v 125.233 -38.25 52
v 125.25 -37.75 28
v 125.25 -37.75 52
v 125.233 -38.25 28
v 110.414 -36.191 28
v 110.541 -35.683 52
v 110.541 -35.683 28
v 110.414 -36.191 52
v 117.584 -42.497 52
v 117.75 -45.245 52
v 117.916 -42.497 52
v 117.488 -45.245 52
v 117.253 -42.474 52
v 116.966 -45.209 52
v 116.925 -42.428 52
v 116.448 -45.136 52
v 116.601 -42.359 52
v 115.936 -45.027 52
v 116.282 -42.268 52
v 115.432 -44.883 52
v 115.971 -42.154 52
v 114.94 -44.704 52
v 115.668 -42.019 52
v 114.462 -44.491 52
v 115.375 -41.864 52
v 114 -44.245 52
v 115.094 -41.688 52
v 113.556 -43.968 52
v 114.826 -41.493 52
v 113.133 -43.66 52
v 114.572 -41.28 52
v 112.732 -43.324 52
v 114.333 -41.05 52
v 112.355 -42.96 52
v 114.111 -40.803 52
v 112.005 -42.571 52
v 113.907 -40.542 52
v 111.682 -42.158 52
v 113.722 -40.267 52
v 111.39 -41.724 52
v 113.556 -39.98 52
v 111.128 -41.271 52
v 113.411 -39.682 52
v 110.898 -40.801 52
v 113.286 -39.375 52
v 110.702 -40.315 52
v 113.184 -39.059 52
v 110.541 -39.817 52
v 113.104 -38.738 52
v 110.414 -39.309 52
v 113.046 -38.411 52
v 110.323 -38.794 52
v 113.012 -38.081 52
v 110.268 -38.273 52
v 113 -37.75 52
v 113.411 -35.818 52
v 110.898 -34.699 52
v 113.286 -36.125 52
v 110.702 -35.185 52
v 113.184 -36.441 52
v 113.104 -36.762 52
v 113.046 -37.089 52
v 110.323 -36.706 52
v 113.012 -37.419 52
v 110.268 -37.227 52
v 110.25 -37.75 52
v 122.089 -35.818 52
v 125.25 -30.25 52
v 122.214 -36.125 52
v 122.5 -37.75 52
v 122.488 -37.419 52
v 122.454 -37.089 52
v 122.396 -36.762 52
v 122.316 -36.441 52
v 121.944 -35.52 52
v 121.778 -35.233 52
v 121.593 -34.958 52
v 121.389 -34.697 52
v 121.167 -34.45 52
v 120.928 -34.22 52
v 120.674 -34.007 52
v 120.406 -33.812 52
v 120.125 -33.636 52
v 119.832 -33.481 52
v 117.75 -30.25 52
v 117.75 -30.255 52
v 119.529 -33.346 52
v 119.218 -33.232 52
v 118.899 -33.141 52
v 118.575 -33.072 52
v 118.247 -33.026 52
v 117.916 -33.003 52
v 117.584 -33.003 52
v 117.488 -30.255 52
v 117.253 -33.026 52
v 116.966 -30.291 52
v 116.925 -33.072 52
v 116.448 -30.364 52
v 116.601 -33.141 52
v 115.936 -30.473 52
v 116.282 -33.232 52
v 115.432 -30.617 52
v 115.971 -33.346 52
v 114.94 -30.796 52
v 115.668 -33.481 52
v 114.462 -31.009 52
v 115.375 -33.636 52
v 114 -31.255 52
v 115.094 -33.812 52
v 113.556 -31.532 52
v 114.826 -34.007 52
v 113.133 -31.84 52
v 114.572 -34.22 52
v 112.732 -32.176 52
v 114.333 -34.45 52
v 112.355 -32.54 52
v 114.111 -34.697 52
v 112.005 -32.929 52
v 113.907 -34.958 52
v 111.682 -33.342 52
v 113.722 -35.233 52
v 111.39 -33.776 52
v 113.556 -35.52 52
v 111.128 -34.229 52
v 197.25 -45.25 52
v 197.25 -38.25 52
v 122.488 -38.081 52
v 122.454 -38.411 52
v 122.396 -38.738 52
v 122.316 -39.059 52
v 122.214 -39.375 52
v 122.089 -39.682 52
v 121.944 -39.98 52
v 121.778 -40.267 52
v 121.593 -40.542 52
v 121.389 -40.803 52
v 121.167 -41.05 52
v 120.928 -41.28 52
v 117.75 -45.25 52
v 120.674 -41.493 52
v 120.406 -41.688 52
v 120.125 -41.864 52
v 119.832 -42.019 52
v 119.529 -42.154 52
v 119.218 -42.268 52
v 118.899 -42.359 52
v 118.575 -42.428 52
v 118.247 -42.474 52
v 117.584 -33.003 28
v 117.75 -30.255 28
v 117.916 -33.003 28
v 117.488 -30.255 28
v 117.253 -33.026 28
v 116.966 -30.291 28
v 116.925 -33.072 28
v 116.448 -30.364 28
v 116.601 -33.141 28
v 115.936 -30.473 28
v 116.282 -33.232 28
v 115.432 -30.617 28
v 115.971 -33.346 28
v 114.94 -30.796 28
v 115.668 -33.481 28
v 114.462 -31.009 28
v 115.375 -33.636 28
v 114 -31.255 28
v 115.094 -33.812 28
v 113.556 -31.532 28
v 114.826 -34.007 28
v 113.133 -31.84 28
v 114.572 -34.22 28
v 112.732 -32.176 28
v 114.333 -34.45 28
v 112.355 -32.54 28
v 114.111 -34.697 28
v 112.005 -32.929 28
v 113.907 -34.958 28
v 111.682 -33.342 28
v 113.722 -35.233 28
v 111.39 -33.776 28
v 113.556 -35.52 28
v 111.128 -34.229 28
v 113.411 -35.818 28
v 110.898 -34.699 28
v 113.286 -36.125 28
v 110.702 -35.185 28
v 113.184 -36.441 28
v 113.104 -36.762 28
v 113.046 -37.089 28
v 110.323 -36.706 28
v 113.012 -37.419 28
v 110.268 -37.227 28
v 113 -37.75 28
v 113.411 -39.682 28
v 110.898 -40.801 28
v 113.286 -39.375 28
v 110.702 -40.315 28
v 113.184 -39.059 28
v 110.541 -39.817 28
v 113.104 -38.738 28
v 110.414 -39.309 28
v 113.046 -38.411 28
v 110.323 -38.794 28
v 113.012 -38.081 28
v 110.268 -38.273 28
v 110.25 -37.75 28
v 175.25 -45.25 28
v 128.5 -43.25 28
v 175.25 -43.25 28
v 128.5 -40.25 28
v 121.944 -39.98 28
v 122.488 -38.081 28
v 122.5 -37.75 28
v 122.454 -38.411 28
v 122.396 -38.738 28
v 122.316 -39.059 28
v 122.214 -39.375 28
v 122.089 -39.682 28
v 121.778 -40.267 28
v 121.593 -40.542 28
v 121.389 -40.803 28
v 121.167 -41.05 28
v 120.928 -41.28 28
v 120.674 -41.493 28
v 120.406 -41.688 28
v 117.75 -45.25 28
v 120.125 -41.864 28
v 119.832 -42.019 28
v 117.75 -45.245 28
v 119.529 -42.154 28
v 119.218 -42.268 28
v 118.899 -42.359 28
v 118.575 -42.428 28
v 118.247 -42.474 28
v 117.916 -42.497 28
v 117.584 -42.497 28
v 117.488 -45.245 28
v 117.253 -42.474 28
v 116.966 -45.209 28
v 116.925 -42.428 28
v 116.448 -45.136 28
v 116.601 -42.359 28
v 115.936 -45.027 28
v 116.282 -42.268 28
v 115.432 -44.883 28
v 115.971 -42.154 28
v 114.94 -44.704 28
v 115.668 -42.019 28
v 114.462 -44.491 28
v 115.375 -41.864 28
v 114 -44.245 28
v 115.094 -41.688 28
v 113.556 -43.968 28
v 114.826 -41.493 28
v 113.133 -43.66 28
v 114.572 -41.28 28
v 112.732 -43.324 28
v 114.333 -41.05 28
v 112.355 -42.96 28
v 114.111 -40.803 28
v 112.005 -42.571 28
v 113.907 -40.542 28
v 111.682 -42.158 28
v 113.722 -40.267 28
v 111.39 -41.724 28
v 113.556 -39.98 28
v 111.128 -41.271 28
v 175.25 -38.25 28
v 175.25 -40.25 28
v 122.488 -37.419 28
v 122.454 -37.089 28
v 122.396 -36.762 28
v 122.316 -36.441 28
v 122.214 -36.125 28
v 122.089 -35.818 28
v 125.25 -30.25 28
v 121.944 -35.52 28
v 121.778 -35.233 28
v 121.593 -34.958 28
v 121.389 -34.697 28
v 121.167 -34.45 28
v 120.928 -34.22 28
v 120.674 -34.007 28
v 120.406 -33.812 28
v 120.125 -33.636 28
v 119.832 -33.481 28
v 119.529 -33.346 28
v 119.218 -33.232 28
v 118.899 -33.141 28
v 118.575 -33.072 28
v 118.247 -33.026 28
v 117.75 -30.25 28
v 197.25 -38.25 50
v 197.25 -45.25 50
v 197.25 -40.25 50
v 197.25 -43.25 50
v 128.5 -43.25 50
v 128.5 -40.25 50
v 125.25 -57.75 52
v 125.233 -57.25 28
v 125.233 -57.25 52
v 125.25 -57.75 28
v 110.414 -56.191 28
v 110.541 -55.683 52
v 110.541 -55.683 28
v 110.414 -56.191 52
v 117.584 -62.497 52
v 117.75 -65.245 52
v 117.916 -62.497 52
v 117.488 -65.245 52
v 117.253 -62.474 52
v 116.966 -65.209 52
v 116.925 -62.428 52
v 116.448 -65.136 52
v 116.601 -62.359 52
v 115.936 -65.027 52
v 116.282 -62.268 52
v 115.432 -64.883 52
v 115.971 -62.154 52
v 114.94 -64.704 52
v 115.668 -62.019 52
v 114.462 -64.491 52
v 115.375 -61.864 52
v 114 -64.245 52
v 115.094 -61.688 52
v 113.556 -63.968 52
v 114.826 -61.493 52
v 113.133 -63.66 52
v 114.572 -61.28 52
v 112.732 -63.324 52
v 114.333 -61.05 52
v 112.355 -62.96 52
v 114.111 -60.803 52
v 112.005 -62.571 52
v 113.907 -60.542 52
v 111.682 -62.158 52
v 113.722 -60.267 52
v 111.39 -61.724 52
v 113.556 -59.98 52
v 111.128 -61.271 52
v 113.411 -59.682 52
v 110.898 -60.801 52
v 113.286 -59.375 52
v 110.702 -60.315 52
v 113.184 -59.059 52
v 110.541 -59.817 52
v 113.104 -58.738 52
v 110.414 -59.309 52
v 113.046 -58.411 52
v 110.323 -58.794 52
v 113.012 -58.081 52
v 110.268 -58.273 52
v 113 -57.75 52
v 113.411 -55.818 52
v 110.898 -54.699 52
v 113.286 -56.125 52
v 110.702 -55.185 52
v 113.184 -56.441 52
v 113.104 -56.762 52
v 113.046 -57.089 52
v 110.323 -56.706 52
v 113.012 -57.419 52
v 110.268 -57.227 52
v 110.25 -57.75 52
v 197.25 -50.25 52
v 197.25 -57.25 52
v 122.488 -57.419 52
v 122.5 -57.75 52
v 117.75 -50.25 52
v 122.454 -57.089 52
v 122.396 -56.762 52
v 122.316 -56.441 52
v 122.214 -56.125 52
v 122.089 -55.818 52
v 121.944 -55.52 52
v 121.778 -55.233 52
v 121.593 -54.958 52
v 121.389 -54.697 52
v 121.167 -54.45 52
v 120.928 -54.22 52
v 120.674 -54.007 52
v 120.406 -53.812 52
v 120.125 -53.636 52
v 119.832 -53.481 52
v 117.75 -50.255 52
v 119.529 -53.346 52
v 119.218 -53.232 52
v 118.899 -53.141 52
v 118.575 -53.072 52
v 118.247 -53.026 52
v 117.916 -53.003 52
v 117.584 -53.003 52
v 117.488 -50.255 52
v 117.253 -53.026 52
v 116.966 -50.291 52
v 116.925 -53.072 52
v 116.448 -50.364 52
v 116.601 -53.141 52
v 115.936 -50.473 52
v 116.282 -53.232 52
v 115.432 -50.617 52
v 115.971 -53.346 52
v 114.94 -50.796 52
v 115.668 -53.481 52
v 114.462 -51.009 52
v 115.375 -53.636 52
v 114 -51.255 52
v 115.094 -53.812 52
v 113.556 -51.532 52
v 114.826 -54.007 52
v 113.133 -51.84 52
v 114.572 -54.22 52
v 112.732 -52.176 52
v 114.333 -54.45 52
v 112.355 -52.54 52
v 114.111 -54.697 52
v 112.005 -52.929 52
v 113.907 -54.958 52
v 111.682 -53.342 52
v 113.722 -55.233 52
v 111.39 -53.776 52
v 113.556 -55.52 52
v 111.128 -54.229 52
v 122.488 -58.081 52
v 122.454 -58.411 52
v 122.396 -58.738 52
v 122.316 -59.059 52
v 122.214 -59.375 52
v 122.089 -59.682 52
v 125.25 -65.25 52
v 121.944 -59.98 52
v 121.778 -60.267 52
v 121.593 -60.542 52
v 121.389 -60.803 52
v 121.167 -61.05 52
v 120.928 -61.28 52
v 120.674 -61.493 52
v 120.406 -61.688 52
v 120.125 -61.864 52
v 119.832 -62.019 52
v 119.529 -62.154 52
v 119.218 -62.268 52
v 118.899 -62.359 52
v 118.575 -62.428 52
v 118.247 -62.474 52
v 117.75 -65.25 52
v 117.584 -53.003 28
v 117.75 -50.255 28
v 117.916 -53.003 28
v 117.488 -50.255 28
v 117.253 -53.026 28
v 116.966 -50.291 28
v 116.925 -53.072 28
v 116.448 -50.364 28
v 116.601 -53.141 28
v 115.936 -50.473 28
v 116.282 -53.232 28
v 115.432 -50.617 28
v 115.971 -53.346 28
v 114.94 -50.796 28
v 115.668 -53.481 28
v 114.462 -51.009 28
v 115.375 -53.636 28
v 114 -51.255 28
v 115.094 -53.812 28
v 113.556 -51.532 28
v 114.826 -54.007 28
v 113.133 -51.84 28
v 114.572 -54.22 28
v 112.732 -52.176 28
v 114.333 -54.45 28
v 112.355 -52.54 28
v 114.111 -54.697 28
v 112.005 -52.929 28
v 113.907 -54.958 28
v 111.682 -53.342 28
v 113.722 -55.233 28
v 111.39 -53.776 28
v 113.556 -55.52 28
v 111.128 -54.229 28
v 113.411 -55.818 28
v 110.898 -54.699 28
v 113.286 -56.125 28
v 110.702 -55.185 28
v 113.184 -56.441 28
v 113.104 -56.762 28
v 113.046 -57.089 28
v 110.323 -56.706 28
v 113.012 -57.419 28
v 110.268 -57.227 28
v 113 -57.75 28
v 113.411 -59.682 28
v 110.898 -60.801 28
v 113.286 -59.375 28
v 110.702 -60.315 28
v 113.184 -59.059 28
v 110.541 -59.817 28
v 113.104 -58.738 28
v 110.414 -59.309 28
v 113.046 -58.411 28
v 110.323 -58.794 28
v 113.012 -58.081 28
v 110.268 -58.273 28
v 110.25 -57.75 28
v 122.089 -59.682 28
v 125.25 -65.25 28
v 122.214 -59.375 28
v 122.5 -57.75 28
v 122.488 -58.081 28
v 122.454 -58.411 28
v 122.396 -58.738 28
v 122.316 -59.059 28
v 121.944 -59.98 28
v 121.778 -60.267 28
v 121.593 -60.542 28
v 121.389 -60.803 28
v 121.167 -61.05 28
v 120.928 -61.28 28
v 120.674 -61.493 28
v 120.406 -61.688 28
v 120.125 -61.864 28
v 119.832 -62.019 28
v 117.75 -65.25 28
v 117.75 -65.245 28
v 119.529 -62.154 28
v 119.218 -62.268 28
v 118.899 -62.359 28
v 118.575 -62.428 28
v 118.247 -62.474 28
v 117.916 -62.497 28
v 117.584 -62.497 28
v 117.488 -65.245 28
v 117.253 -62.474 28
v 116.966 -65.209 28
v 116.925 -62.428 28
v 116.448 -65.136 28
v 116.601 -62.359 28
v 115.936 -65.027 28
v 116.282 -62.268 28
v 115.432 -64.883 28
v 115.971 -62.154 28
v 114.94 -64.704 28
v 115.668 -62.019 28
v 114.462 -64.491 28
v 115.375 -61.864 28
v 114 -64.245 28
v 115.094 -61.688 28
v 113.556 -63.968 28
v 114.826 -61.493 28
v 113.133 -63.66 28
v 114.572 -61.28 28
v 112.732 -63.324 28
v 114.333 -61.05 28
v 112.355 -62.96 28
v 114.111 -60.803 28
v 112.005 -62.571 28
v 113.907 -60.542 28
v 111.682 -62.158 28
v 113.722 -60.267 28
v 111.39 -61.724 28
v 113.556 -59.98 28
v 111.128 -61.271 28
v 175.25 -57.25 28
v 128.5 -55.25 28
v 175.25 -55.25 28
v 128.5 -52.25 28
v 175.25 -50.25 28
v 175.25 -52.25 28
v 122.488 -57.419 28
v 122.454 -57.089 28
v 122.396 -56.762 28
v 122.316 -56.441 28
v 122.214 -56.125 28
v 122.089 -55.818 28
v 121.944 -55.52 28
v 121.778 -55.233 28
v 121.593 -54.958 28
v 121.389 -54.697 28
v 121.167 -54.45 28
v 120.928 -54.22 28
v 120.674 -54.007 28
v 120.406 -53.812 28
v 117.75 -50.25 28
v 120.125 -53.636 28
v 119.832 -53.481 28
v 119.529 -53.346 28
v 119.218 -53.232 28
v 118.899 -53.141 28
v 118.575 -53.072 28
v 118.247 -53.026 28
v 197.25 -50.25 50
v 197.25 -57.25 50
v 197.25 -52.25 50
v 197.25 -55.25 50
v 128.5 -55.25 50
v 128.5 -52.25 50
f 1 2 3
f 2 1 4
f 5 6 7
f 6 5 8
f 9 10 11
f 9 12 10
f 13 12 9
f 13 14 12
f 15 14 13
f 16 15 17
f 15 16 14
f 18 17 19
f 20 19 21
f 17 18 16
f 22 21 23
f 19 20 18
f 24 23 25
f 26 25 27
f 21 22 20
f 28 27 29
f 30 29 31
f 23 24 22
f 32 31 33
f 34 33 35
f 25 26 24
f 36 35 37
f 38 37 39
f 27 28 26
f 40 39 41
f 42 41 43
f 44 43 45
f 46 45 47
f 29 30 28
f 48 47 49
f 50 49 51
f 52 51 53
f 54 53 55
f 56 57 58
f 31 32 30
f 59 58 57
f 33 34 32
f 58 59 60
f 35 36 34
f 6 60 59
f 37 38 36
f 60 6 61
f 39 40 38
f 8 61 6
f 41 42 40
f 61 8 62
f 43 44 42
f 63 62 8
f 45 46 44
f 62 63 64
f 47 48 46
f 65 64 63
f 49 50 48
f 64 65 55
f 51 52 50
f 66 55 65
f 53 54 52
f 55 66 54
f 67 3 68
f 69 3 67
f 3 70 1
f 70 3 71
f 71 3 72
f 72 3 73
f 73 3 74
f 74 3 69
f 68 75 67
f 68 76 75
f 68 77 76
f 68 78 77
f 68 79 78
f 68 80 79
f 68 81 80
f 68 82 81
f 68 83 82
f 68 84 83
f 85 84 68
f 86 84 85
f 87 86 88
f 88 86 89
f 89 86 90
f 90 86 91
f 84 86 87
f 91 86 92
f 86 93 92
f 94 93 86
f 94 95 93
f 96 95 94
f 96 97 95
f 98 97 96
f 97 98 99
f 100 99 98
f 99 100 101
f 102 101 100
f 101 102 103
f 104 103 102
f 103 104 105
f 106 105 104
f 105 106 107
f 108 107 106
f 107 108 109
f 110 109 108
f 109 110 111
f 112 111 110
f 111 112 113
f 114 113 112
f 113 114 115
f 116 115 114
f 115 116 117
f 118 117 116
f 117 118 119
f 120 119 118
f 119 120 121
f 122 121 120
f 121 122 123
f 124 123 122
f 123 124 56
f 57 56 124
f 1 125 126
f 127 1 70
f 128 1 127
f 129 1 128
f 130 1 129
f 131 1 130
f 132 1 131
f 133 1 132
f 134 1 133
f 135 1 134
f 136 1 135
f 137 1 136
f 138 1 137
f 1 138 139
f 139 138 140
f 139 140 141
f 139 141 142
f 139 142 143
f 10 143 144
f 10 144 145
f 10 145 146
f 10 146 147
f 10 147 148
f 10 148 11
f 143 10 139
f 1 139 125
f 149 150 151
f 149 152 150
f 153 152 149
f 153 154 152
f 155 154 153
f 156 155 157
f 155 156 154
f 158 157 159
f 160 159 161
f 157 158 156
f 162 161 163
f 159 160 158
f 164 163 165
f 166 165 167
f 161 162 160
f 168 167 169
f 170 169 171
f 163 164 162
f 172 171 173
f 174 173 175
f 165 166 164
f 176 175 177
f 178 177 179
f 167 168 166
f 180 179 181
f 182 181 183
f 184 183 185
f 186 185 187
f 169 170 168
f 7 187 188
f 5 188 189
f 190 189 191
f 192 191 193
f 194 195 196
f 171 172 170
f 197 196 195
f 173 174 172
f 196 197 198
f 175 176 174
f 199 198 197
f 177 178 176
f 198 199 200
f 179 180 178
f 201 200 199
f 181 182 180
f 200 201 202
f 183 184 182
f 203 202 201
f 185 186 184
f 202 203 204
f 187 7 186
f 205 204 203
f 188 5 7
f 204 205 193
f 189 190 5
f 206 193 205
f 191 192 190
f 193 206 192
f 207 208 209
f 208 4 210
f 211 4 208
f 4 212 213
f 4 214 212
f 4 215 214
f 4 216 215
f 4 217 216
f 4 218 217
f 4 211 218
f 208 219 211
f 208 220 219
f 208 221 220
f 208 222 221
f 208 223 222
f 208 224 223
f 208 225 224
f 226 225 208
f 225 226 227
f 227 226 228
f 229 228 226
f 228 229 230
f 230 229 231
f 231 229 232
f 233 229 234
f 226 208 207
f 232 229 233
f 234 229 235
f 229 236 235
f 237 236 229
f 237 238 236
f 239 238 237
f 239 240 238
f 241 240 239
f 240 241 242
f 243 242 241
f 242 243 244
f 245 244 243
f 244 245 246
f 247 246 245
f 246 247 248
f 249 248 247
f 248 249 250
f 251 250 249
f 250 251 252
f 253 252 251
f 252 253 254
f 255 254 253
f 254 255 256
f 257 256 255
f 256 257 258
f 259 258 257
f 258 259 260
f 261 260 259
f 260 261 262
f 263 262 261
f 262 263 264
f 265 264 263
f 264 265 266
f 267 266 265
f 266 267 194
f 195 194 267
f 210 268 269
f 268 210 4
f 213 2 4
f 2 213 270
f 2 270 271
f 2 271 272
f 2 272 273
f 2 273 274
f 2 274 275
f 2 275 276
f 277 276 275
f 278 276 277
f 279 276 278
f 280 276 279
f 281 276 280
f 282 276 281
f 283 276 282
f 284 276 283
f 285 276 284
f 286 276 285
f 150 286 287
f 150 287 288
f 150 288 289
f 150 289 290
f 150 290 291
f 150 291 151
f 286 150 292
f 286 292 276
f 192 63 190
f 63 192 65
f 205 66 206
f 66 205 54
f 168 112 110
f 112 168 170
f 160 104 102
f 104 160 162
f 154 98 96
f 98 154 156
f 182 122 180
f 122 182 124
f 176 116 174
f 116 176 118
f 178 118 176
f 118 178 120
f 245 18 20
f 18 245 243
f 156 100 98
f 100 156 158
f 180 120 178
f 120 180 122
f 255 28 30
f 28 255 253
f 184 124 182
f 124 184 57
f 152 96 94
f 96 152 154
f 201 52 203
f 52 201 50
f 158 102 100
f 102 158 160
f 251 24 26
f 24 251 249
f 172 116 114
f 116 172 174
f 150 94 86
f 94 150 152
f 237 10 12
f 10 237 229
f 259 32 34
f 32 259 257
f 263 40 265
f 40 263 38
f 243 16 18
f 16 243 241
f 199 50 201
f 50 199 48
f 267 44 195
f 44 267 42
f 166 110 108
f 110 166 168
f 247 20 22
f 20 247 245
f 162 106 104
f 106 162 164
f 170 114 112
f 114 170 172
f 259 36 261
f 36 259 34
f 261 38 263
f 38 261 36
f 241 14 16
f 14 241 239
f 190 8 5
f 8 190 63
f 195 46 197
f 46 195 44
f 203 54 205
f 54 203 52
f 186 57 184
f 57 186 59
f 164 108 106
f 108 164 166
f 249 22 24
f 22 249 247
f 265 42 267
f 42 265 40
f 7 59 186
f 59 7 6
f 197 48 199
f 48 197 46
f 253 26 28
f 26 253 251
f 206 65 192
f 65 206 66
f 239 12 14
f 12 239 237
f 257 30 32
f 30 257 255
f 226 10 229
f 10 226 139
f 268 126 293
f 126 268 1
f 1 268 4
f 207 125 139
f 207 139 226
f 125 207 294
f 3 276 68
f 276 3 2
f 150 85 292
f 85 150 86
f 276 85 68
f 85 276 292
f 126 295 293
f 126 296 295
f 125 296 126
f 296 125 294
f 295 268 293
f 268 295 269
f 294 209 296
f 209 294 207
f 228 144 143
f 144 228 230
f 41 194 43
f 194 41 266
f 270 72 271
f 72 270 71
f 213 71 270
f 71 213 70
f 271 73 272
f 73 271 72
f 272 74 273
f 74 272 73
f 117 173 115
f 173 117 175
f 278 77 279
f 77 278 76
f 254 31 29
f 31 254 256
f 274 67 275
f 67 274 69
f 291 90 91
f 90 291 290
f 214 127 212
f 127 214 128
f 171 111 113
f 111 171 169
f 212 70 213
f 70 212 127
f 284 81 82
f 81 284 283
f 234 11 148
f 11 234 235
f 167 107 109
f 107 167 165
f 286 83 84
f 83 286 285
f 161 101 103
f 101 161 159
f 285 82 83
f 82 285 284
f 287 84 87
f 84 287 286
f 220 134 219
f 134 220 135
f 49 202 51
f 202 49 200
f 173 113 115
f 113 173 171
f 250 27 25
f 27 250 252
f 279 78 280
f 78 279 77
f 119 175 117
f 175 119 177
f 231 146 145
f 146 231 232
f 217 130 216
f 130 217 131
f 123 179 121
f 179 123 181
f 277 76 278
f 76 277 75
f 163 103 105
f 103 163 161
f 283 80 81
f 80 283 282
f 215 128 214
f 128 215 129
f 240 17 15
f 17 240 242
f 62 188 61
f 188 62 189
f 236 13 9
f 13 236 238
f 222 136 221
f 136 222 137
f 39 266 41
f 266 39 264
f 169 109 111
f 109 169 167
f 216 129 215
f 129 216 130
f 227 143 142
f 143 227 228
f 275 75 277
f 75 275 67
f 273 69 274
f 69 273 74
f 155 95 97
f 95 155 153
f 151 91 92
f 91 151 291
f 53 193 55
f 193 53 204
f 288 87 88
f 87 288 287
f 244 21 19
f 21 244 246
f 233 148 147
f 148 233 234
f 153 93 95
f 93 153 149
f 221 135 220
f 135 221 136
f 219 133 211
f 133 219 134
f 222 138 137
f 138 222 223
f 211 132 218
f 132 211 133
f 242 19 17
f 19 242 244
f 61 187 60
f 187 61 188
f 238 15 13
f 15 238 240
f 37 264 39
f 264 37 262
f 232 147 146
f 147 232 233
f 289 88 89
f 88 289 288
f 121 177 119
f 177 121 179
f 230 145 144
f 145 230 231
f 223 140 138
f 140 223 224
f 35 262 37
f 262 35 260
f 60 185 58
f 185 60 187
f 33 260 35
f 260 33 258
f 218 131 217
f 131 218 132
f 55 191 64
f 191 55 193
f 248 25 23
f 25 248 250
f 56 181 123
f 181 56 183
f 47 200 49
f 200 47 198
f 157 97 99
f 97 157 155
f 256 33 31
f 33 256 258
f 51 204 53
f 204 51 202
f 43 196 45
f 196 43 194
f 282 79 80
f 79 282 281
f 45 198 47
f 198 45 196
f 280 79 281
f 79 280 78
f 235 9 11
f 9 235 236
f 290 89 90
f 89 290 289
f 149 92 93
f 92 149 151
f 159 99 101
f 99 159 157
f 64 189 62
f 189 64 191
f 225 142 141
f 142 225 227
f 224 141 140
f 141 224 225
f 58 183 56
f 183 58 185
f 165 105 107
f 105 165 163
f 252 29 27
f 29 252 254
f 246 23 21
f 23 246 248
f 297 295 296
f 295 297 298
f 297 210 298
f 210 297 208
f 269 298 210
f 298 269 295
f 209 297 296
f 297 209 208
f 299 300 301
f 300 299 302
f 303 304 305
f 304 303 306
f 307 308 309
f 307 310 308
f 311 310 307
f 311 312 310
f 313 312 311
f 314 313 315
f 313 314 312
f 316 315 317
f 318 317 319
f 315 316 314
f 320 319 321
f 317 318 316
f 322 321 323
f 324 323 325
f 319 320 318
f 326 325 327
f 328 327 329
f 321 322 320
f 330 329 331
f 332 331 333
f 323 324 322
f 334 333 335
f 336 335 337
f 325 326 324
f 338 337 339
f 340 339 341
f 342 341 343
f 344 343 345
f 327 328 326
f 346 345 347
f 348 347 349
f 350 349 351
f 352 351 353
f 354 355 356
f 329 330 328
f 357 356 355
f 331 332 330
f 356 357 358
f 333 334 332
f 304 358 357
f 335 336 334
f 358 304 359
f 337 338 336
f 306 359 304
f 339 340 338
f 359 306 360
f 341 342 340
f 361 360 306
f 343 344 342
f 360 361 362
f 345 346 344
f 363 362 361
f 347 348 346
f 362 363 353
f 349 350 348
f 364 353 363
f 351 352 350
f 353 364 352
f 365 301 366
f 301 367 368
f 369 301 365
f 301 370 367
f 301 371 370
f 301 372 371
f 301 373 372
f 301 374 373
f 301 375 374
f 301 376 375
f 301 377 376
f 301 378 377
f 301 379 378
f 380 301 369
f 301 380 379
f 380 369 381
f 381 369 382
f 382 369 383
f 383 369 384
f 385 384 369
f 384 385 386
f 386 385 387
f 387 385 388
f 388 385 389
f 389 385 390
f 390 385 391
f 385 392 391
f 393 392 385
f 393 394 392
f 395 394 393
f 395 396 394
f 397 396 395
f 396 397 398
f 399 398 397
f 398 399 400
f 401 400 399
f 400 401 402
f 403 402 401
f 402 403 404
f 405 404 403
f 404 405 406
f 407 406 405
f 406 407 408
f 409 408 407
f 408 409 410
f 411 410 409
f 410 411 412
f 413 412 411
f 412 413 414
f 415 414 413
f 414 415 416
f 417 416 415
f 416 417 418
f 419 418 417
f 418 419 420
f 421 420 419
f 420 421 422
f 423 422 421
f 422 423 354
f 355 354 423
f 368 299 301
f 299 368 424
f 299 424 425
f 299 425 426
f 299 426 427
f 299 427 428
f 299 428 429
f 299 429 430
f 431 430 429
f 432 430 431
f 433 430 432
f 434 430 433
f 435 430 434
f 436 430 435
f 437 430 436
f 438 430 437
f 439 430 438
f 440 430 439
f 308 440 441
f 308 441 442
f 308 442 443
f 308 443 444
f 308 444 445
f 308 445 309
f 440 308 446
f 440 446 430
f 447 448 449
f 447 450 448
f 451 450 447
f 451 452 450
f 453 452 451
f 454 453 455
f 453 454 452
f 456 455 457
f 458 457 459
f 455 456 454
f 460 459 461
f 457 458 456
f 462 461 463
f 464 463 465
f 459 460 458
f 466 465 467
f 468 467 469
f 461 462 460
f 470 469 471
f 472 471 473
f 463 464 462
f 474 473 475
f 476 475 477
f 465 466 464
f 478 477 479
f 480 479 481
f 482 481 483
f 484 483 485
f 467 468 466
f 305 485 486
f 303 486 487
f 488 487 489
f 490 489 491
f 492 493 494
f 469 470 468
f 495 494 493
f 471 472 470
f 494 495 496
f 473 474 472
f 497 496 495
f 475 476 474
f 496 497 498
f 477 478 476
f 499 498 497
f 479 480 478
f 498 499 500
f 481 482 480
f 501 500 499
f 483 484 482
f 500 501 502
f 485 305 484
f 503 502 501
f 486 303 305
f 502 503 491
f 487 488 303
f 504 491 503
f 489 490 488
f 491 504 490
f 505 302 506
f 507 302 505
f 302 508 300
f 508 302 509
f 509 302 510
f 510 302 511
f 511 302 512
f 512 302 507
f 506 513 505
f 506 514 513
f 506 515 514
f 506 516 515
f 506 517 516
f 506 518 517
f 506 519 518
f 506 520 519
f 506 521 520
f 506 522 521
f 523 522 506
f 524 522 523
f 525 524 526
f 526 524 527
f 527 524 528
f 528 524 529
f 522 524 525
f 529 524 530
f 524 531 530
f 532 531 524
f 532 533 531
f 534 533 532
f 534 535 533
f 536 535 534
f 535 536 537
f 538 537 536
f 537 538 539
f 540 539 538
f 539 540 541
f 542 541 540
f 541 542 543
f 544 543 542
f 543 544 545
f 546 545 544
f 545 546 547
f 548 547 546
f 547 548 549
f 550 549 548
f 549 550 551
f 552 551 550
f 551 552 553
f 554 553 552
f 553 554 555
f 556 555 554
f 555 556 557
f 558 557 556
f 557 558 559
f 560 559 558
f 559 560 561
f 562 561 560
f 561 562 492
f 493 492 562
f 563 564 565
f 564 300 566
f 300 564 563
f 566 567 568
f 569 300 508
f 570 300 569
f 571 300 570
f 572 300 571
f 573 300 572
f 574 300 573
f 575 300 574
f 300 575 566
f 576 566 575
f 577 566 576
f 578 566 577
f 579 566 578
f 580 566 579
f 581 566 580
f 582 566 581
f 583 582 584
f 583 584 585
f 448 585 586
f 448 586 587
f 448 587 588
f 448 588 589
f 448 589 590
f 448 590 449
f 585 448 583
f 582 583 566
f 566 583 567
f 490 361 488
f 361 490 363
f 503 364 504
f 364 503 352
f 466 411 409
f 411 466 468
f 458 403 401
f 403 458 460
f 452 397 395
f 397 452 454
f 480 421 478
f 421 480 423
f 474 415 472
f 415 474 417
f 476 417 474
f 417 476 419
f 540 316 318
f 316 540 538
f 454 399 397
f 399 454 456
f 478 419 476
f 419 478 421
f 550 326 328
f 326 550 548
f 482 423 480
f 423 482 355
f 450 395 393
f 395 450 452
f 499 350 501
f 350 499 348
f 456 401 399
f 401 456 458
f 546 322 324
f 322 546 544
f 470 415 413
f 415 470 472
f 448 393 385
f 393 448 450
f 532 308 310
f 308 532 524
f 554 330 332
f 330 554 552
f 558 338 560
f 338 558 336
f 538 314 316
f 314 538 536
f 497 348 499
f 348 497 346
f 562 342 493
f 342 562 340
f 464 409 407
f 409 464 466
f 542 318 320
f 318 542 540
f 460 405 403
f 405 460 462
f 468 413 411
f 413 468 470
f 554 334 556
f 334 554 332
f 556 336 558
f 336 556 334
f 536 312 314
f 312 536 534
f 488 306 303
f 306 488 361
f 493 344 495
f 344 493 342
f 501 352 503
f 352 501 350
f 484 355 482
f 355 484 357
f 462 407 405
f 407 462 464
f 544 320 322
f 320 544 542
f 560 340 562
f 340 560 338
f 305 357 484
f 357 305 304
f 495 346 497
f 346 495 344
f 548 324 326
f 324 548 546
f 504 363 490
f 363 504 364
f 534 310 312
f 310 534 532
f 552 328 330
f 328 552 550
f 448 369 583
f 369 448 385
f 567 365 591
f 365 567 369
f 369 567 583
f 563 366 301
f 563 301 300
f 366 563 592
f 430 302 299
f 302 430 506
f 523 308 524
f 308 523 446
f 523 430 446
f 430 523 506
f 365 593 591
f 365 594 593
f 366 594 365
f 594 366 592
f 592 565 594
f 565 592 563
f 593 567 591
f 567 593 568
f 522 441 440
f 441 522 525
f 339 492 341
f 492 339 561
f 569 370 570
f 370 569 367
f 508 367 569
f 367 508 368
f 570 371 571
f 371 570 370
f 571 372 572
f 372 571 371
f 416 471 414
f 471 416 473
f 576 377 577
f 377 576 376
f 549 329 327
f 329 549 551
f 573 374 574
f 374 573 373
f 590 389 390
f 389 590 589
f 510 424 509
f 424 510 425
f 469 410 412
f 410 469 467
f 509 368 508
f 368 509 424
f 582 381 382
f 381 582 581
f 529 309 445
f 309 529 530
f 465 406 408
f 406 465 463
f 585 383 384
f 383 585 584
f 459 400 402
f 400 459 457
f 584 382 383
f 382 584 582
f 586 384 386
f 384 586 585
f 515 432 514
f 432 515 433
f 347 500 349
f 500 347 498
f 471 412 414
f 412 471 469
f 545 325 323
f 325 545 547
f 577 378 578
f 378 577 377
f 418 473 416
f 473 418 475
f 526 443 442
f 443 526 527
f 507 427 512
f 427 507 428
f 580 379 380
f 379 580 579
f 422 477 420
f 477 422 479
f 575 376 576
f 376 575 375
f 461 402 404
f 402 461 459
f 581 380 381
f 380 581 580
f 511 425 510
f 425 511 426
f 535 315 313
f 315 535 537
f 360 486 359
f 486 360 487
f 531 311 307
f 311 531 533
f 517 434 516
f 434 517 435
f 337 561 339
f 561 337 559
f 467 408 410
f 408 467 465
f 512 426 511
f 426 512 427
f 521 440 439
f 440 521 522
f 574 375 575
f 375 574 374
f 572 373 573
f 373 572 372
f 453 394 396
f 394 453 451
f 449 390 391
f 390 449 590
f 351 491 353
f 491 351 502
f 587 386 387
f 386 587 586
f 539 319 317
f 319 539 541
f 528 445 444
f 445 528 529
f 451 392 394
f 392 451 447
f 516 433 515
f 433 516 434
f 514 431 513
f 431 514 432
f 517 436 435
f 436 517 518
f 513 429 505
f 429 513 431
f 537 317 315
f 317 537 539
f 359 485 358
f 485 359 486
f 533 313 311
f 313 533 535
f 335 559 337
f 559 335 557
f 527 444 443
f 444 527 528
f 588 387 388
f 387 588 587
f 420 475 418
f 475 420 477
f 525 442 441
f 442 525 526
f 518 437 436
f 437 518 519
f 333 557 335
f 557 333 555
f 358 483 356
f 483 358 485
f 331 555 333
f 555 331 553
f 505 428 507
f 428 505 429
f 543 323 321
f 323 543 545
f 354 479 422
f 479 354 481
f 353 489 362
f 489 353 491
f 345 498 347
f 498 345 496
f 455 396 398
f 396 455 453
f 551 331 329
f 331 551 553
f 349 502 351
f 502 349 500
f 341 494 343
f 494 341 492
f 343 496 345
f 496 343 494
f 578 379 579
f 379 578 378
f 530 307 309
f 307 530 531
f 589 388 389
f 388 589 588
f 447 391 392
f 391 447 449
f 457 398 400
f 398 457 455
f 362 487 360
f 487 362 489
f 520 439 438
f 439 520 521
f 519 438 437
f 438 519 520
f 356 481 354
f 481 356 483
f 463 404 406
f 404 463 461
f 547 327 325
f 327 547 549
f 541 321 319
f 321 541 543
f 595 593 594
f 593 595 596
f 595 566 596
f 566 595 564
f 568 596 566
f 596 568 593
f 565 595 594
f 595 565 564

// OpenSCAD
$fn = 90;
tol = 0.2;
z_tol = 0.5;
eps = 0.01;

// connector properties
c_a = 51;
c_wt = 5;
c_wh = 25;
c_h = 22;

// M3
// bolt and nuts parameters
m3_l=13;
m3_d=3;
m3_nd=6.25+tol;
m3_nh=2.3;
m3_hd=5.5+tol;
m3_hh=2;

// screw
m3_shd = 7.0+tol;
m3_sd = 3.5;
m3_sl = 20;

m3_off = 5;

// plexiglass holder parameters
pg_t = 3;
pg_wt = 2;

// foot interface parameters
// height of the foot interface part
ft_h = 22;
// additional foot height for the insulation and cable management
ft_ho = 6;
// thickness of the part screwed to the lower table
ft_t = 2;
// diameter of the inner cone base
ft_Di = 35;
// diameter of the outer cone base
ft_Do = ft_Di + 1;
// diameter of the top inner cone area
ft_di = 20;
// diameter of the top outer cone area
ft_do = ft_di + 1;
// height of the inner cone
ft_chi = 14.5;
// height of the outer cone
ft_cho = ft_chi + 0.5;

// huge hole depths
// absolute base, e.g. piece screwed to the table dest bellow
hhd_b = 5;
// middle piece on the foot of the table leg
hhd_m = 4;
// top part connected to the top desk
hhd_t = 3;

// hinge parameters
// bottom hinge inner height
hh_ib = 16+8;
// bottom hinge outer height
hh_ob = hh_ib + z_tol;
// top hinge inner height
hh_it = 16;
// top hinge outer height
hh_ot = hh_it + z_tol;

// hinge diameters
h_id = 9;
h_od = h_id + 0.5;
h_iD = h_id + 6;
h_oD = h_od + 6;

// hinge frames lenght
hf_lu = 50;

// hole for the m3 nuts and bolt
module bn_hole()
{
    // nuts
    translate([0,0,-1.5*m3_l+eps])
        cylinder(d=m3_nd, h=m3_l, $fn=6);
    // bolt body
    translate([0,0,-0.5*m3_l])
        cylinder(d=m3_d, h=m3_l);
    // bolt head
    translate([0,0,0.5*m3_l-eps])
        cylinder(d=m3_hd, h=m3_l);
}


// hole for the 3mm screws
module s_hole()
{
    // head
    _h = m3_shd-m3_d;
    cylinder(d1=m3_shd,d2=m3_sd,h=_h/2);
    // body
    cylinder(d=m3_sd,h=m3_sl);
}


// hole for the huge screw
module huge_screw_hole(hh)
{
    // body
    cylinder(d=7, h=c_h);
    // head
    cylinder(d=14,h=hh);
}


// round corner cube module
module rc_cube(size,r)
{
    a = size.x;
    b = size.y;
    c = size.z;
    
    pos = [ [r,r,0],
            [r,b-r,0],
            [a-r,b-r,0],
            [a-r,r,0]];
    
    // corners
    for(p=pos)
    {
        translate(p)
            cylinder(r=r,h=c);
    }
    
    // inner fill
    translate([r,0,0])
        cube([a-2*r,b,c]);
    translate([0,r,0])
        cube([a,b-2*r,c]);
}



// module creating cube with top/buttom sloped side
module ss_cube(size,sh)
{
    // main cube parameters
    A = size.x;
    B = size.y;
    C = size.z;
    
    // small cube creating slope parameter
    a = A - 2*abs(sh);
    b = B - 2*abs(sh);
    c = abs(sh);
    t = sh > 0 ? [sh,sh,C] : [-sh,-sh,sh];
    
    render(1)
    hull()
    {
        cube([A,B,C]);
        translate(t)
            cube([a,b,c]);
    }    
}


module ses_cube(size,sh)
{
    render(3)
    difference()
    {
        ss_cube(size, sh);
        a = size.x - 2*abs(sh);
        b = size.y - 2*abs(sh);

        c = abs(sh);
        t = sh > 0 ? [sh,sh,size.z+sh] : [-sh,-sh,2*sh];
        translate(t)
            ss_cube([a,b,c],-sh);
    }
    
}


// plexiglass holder
module pg_holder(bt=pg_wt)
{
    difference()
    {
        render(1)
        hull()
        {
            // horizontal part
            translate([0,0,pg_wt-bt])
                cube([c_h,pg_t+2*pg_wt,bt]);
            // vertical part
            translate([-(bt)+pg_wt,0,-bt+pg_wt])
                cube([bt,pg_t+2*pg_wt,c_h+bt-pg_wt]);
        }
        translate([pg_wt,pg_wt,pg_wt])
            cube([c_h,pg_t,c_h]);
    }
    
}


// basic shape of the connector
module connector_base(off=0,cut=0)
{
    // base part
    translate([-c_a/2-c_wt,-c_a/2-c_wt,(off==-1 ? -off : 0 )*c_wh])
        rc_cube([c_a+c_wt,c_a+c_wt,c_h/2],5);
    // main geometry
    render(1)
    hull()
    {
        _xo = (cut==-1 ? (cut)*h_oD : 0);
        _yo = -(cut==+1 ? (cut)*h_oD : 0);
        translate([-c_a/2-c_wt,-c_a/2-c_wt,0])
            rc_cube([c_a+c_wt+_xo,c_a+c_wt+_yo,c_h/2+c_wh],5);
        translate([-c_a/2,-c_a/2,off*5])
            cube([c_a-5+_xo,c_a-5+_yo,c_h/2+c_wh]);
    }
}


module bolt_holes(generate=[1,1,1,1])
{
    pos = [ [-c_a/2+m3_off,-c_a/2+m3_off,0],
            [-c_a/2+m3_off,+c_a/2-m3_off,0],
            [+c_a/2-m3_off,+c_a/2-m3_off],
            [+c_a/2-m3_off,-c_a/2+m3_off]];
    
    for(i=[0:3])
    {
        p=pos[i];
        if(generate[i]==1)
        {
            translate(p)
                bn_hole();
        }
    }
}

module screw_holes(off=0)
{
    // '-> positions
    s_pos = [   [+c_a/2-c_wt-m3_shd,-c_a/2-c_wt-eps,off+m3_shd],
                [-c_a/2+m3_shd,-c_a/2-c_wt-eps,off-m3_shd+c_wh],
                [-c_a/2-c_wt-eps,-c_a/2+m3_shd,off+m3_shd],
                [-c_a/2-c_wt-eps,+c_a/2-c_wt-m3_shd,off-m3_shd+c_wh],
                [c_a/2+c_wt+eps,+c_a/2-c_wt-m3_shd,off+m3_shd],
                [c_a/2-c_wt-m3_shd,+c_a/2+c_wt+eps,off-m3_shd+c_wh]];
    
    // '-> rotations
    s_rot = [   [-90,0,0],
                [-90,0,0],
                [0,90,0],
                [0,90,0],
                [0,-90,0],
                [90,0,0]];
    
    for(i=[0:5])
    {
        cp = s_pos[i];
        cr = s_rot[i];
        translate(cp)
            rotate(cr)
                s_hole();
    }  
    
}


// main hinge 
module outer_hinge(h,right=0,bolt_offset=0)
{
    // main hinge axle
    difference()
    {
        
        union()
        {
            rotate([0,0,0*90])
            {
                cylinder(d=h_oD,h=h);
                    
                cube([h_oD/2,h_oD/2,h]);
                translate([-h_oD/2,-h_oD/2,0])
                    cube([h_oD/2,h_oD/2,h]);
            }
            
            // cutting off the outer support wall
            rotate([0,0,(-right)*90])
            {
                translate([-h_oD/2,-h_oD/2-c_wt,0])
                    cube([h_oD+eps,c_wt+h_oD/2,h]);
                translate([-h_oD/2,-h_oD/2-c_wt-eps,0-(c_h-h)/2-eps])
                    cube([h_oD,c_wt+eps,c_h+2*eps]);
            }
        }
        translate([0,0,-eps])
            cylinder(d=h_id,h=h+2*eps);
    }
    
    // bolt reinforcement
    translate([0,0,h-ft_h+m3_l/2+z_tol+m3_nh+bolt_offset])
        rotate([180,0,0])
            bn_hole();
}


module outer_hinge_simple(h,right=0)
{
    // main hinge axle
    difference()
    {
        
        union()
        {
            // I am sorry, but this make not much sense
            rotate([0,0,180-right*90])
            {
                cylinder(d=h_oD,h=h);
                
                cube([h_oD/2,h_oD/2,h]);
                translate([-h_oD/2,-h_oD/2,0])
                    cube([h_oD/2,h_oD/2,h]);
                translate([-h_oD/2,-h_oD/4,0])
                cube([3*h_oD/4,3*h_oD/4,h]);
            }
        }
        translate([0,0,-eps])
            cylinder(d=h_id,h=h+2*eps);
    }
    
    // bolt reinforcement
    translate([0,0,h-ft_h+m3_l/2+z_tol+m3_nh])
        rotate([180,0,0])
            bn_hole();
}

/********************
* UPPER CONNECTOTRS *
********************/
// REGULAR UPPER CONNECTORS (BACK)
module upper_upper_connector()
{
    difference()
    {
        // basic shape and the plexiglass hooks
        union()
        {
            // connector base
            connector_base(1);
            
            // additional support
            leg_inner_support(upper=1);
            
            // plexiglass hooks
            translate([c_a/2-pg_wt,-c_a/2,c_h/2])
                difference()
                {
                    rotate([0,90,0])
                        pg_holder();
                    _a = c_h;
                    translate([-eps,-eps,-_a-eps])
                        cube([_a,_a,_a/2+eps]);
                }
                
            // plexiglass hooks
            translate([-c_a/2+2*pg_wt+pg_t,c_a/2-pg_wt,c_h/2])
                difference()
                {
                    rotate([0,90,90])
                        pg_holder();
                    _a = c_h;
                    translate([eps-_a,-eps,-_a-eps])
                        cube([_a,_a,_a/2+eps]);
                }
        }
        
        // cut for the table leg
        translate([-c_a/2,-c_a/2,c_h/2])
            ses_cube([c_a+eps,c_a+eps,2*c_wh+eps],-3);
        
        
        // main hole cut
        translate([0,0,-c_h/2+eps])
            huge_screw_hole(hhd_t);
        
        
        // holes for the bolts and nuts
        bolt_holes();
        
        // holes for the screws
        screw_holes(c_h/2);
    }

}

module leg_inner_support(upper=0)
{
    cut = 1;
    translate([5,5,0])
    render(1)
    hull()
    {
        _xo = h_oD;
        _yo = h_oD;
        translate([-c_wt,-c_wt,0])
            rc_cube([c_a/2+c_wt,c_a/2+c_wt,(upper == 0) ? c_h/2+c_wh : c_h/2],5);
        translate([0,0,(upper == 0) ? -5 : 0])
            cube([c_a/2-5,c_a/2-5,(upper == 0) ? c_h/2+c_wh : c_h/2]);
    }
}

module upper_lower_connector()
{
    difference()
    {
        // basic shape and the plexiglass hooks
        union()
        {
            
            // connector base
            connector_base(-1);
            
            // additional support
            leg_inner_support();
            
            // plexiglass hooks
            translate([c_a/2-pg_wt,-c_a/2,c_wh+c_h])
                difference()
                {
                    rotate([0,90,0])
                        pg_holder();
                    _a = c_h+2*eps;
                    translate([-eps,-eps,-_a+c_h/2+eps])
                        cube([_a,_a,_a/2+eps]);
                }
                
            // plexiglass hooks
            translate([-c_a/2+2*pg_wt+pg_t,c_a/2-pg_wt,c_wh+c_h])
                difference()
                {
                    rotate([0,90,90])
                        pg_holder();
                    _a = c_h+2*eps;
                    translate([eps-_a,-eps,-_a+c_h/2+eps])
                        cube([_a,_a,_a/2+eps]);
                }
        }
        
        // cut for the table leg
        translate([-c_a/2,-c_a/2,-c_wh-eps])
            ses_cube([c_a+eps,c_a+eps,2*c_wh+eps],3);
        
        // main hole cut
        translate([0,0,c_wh-eps])
            huge_screw_hole(hhd_t);
        
        
        // holes for the bolts and nuts
        translate([0,0,c_wh+c_h/2])
            bolt_holes();
        
        // holes for the screws
        screw_holes();
    }
    
}

// LEFT FRONT CONNECTOR
module left_upper_upper_connector()
{
    difference()
    {
        // basic shape and the plexiglass hooks
        union()
        {
            // connector base
            connector_base(off=1,cut=-1);
            
            // additional support
            leg_inner_support(upper=1);
            
            // plexiglass hooks
            translate([-c_a/2+2*pg_wt+pg_t,c_a/2-pg_wt,c_h/2])
                difference()
                {
                    rotate([0,90,90])
                        pg_holder();
                    _a = c_h;
                    translate([eps-_a,-eps,-_a-eps])
                        cube([_a,_a,_a/2+eps]);
                }
        }
        
        render(2)
        difference()
        {
            // cut for the table leg
            translate([-c_a/2,-c_a/2,c_h/2])
                ses_cube([c_a+eps,c_a+eps,2*c_wh+eps],-3);
            
            // hinge reinforcement
            hr = h_oD+2;
            translate([c_a/2-hr,-c_a/2,0])
                cube([hr,hr,c_h/2]);
        }
        
        // main hole cut
        translate([0,0,-c_h/2+eps])
            huge_screw_hole(hhd_t);
        
        
        // holes for the bolts and nuts
        bolt_holes([1,1,1,0]);
        
        // holes for the screws
        screw_holes(c_h/2);
        
        // hinge cut
        translate([c_a/2-h_oD/2,-c_a/2+h_oD/2,-c_h/2+(c_h-hh_ot)/2])
            outer_hinge(h=hh_ot,right=0,bolt_offset=(c_h-m3_l)/2);
    }

}


module left_upper_lower_connector()
{
    difference()
    {
        // basic shape and the plexiglass hooks
        union()
        {
            
            // connector base
            connector_base(off=-1,cut=-1);
            
            // additional leg support
            leg_inner_support();
                                   
            // plexiglass hooks
            translate([-c_a/2+2*pg_wt+pg_t,c_a/2-pg_wt,c_wh+c_h])
                difference()
                {
                    rotate([0,90,90])
                        pg_holder();
                    _a = c_h+2*eps;
                    translate([eps-_a,-eps,-_a+c_h/2+eps])
                        cube([_a,_a,_a/2+eps]);
                }
            
        }
        
        // cut for the table leg
        render(2)
        difference()
        {
            translate([-c_a/2,-c_a/2,-c_wh-eps])
                ses_cube([c_a+eps,c_a+eps,2*c_wh+eps],3);
            // hinge reinforcement
            hr = h_oD+2;
            translate([c_a/2-hr,-c_a/2,c_wh])
                cube([hr,hr,c_h/2]);
        }
        
        // main hole cut
        translate([0,0,c_wh-eps])
            huge_screw_hole(hhd_t);
        
        
        // holes for the bolts and nuts
        translate([0,0,c_wh+c_h/2])
            bolt_holes([1,1,1,0]);
        
        // holes for the screws
        screw_holes();
        
        // hinge cut
        translate([c_a/2-h_oD/2,-c_a/2+h_oD/2,c_wh+(c_h-hh_ot)/2])
            outer_hinge(h=hh_ot,right=0,bolt_offset=(c_h-m3_l)/2);
        
    }
    
}


// RIGHT FRONT CONNECTOR
module right_upper_upper_connector()
{
    difference()
    {
        // basic shape and the plexiglass hooks
        union()
        {
            // connector base
            connector_base(off=1,cut=1);
            
            // additional support
            leg_inner_support(upper=1);
                         
            // plexiglass hooks
            translate([c_a/2-pg_wt,-c_a/2,c_h/2])
                difference()
                {
                    rotate([0,90,0])
                        pg_holder();
                    _a = c_h;
                    translate([-eps,-eps,-_a-eps])
                        cube([_a,_a,_a/2+eps]);
                }
        }
        
        render(2)
        difference()
        {
            // cut for the table leg
            translate([-c_a/2,-c_a/2,c_h/2])
                ses_cube([c_a+eps,c_a+eps,2*c_wh+eps],-3);
            
            // hinge reinforcement
            hr = h_oD+2;
            translate([-c_a/2,c_a/2-hr,0])
                cube([hr,hr,c_h/2]);
        }
        
        // main hole cut
        translate([0,0,-c_h/2+eps])
            huge_screw_hole(hhd_t);
        
        
        // holes for the bolts and nuts
        bolt_holes([1,0,1,1]);
        
        // holes for the screws
        screw_holes(c_h/2);
        
        // hinge cut
        translate([-c_a/2+h_oD/2,c_a/2-h_oD/2,-c_h/2+(c_h-hh_ot)/2])
            outer_hinge(h=hh_ot,right=1,bolt_offset=(c_h-m3_l)/2);
    }

}



module right_upper_lower_connector()
{
    difference()
    {
        // basic shape and the plexiglass hooks
        union()
        {
            
            // connector base
            connector_base(off=-1,cut=1);
            
            // additional leg support
            leg_inner_support();
                                   
            // plexiglass hooks
            translate([c_a/2-pg_wt,-c_a/2,c_wh+c_h])
                difference()
                {
                    rotate([0,90,0])
                        pg_holder();
                    _a = c_h+2*eps;
                    translate([-eps,-eps,-_a+c_h/2+eps])
                        cube([_a,_a,_a/2+eps]);
                }
            
        }
        
        // cut for the table leg
        render(2)
        difference()
        {
            translate([-c_a/2,-c_a/2,-c_wh-eps])
                ses_cube([c_a+eps,c_a+eps,2*c_wh+eps],3);
            // hinge reinforcement
            hr = h_oD+2;
            translate([-c_a/2,c_a/2-hr,c_wh])
                cube([hr,hr,c_h/2]);
        }
        
        // main hole cut
        translate([0,0,c_wh-eps])
            huge_screw_hole(hhd_t);
        
        
        // holes for the bolts and nuts
        translate([0,0,c_wh+c_h/2])
            bolt_holes([1,0,1,1]);
        
        // holes for the screws
        screw_holes();
        
        // hinge cut
        translate([-c_a/2+h_oD/2,c_a/2-h_oD/2,c_wh+(c_h-hh_ot)/2])
            outer_hinge(h=hh_ot,right=1,bolt_offset=(c_h-m3_l)/2);
        
    }
    
}


// back left
/*
translate([0,100,0])
    rotate([0,0,-90])
        upper_lower_connector();

translate([0,100,50])
    rotate([0,0,-90])
        upper_upper_connector();
*/
/*
// back right

translate([100,100,0])
    rotate([0,0,180])
        upper_lower_connector();

translate([100,100,50])
    rotate([0,0,180])
        upper_upper_connector();

*/

// front left
/*
translate([0,0,50])
    left_upper_upper_connector();

left_upper_lower_connector();
*/

// front right
/*
translate([100,0,50])
    rotate([0,0,90])
        right_upper_upper_connector();

translate([100,0,0])
    rotate([0,0,90])
        right_upper_lower_connector();
*/

module door_hinge(_h,right=0)
{
    // additional plexiglass door offset
    _off = 1.25;
    difference()
    {
        union()
        {
            // basic hinge
            cylinder(h=_h,d=h_iD);
            
            // support frame
            translate(right ? [0,h_iD/2-2*pg_wt-pg_t,0] : [0,-h_iD/2,0])
                cube([h_iD/2+hf_lu,pg_t+2*pg_wt,_h]);
            
            // resting piece
            translate(right ? [0,-h_iD/2,0] : [0,0,0])
                cube([h_iD/2,h_iD/2,_h]);
            
            // support ending
            translate(right ? [hf_lu+h_iD/2-pg_wt,h_iD/2-2*pg_wt-pg_t,0] : [hf_lu+h_iD/2-pg_wt,-h_iD/2,0])
            render(1)
            hull()
            {
                // horizontal part
                translate([0,0,_h-pg_wt])
                    cube([_h,pg_t+2*pg_wt,pg_wt]);
                // vertical part
                cube([pg_wt,pg_t+2*pg_wt,_h]);
            }

            
        }
        
        // hinge axis hole
        translate([0,0,-eps])
            cylinder(h=_h+2*eps,d=h_od);
        
        // plexiglass hole
        translate(right ? [h_iD/2+pg_wt+_off,h_iD/2-pg_wt-pg_t,-pg_wt] : [h_iD/2+pg_wt+_off,-h_iD/2+pg_wt,-pg_wt])
            cube([hf_lu+_h,pg_t,_h]);
    }
}

module upper_hinge(right=0)
{
    door_hinge(_h=hh_it,right=right);
}

module lower_hinge(right=0)
{
    door_hinge(_h=hh_ib, right=right);
}

/*
translate([0,-20,0])
    translate([c_a/2-h_oD/2,-c_a/2+h_oD/2,c_h+5+1])
        upper_hinge();


translate([0,-40,0])
    translate([c_a/2-h_oD/2,-c_a/2+h_oD/2,c_h+5+1])
        upper_hinge(right=1);
*/
translate([100,-20,0])
    translate([c_a/2-h_oD/2,-c_a/2+h_oD/2,c_h+5+1])
        lower_hinge();


translate([100,-40,0])
    translate([c_a/2-h_oD/2,-c_a/2+h_oD/2,c_h+5+1])
        lower_hinge(right=1);

///////////////////////
// BASIC FOOT MODULE //
///////////////////////
// paremeters
// '-> hinge_cut: 0 for no cut, -1 for left, 1 for right
module lower_upper_connector(hinge_cut=0)
{
    difference()
    {
        union()
        {
            // main body
            translate([-c_a/2,-c_a/2,0])
                rc_cube([c_a,c_a,ft_h+ft_ho],5);
            
            // outer leg connector
            _lc_xo = hinge_cut == 1 ? h_oD+c_wt : 0;
            _lc_yo = hinge_cut == 0 ? c_wt : 0;
            _lc_z = c_h/2+c_wh;
            render(0)
            translate([-c_wt-c_a/2+_lc_xo,-c_wt-c_a/2+_lc_yo,+ft_h/2+ft_ho])
            hull()
            {
                
                _lc_a = (hinge_cut>=0) ? (hinge_cut == 0 ? c_a : c_a-h_oD) : c_a-h_oD ;
                
                // main support for leg
                rc_cube([_lc_a+c_wt,c_a+c_wt,_lc_z],5);
                
                // fancy sloped edges
                 
                translate([c_wt,c_wt,-5])
                    cube([_lc_a-c_wt,c_a-c_wt,_lc_z+10]);
            }
            
            // inner leg connector
            _ilc_xo = hinge_cut == 1 ? -c_a/2-c_wt : 0;
            _ilc_yo = hinge_cut == 0 ? -c_a/2-c_wt : 0;
            translate([c_wt+_ilc_xo,c_wt+_ilc_yo,ft_h/2+ft_ho])
            render(0)
            hull()
            {
                _xo = h_oD;
                _yo = h_oD;
                translate([-c_wt,-c_wt,0])
                    rc_cube([c_a/2+c_wt,c_a/2+c_wt,_lc_z],5);
                translate([0,0,-c_wt])
                    cube([c_a/2-5,c_a/2-5,_lc_z+10]);
            }
            
            
        
        }
        
        // conical cut
        translate([0,0,-eps])
            cylinder(d1=ft_Do,d2=ft_do,h=ft_cho+2*eps);
        
        // cut for the screw to slide in
        translate([0,0,ft_cho])
            huge_screw_hole(hhd_m);
        
        // screw cut
        _a = hinge_cut == 0 ? -90 : (hinge_cut == 1 ? 90 : 0);
        rotate([0,0,_a])
        translate([0,0,ft_h+ft_ho])
            screw_holes();        
    }
}

module lower_leg_cut(hinge_cut=0)
{
    // leg cut
    translate([0,0,ft_h+ft_ho])
    render(2)
    difference()
    {
        translate([-c_a/2,-c_a/2-eps,-eps])
            ses_cube([c_a+eps,c_a+2*eps,2*c_wh+eps],-3);
        // hinge reinforcement
        hr = h_oD+2;
        _hrt = hinge_cut == 0 ?
                [0,0,-2*hr] : (hinge_cut == 1 ?
                                [-c_a/2,-c_a/2,-c_h/2] :
                                [c_a/2-hr,-c_a/2,-c_h/2] );
        translate(_hrt)
            cube([hr,hr,c_h/2]);
    }
}

// module for back table leg foots,
module lower_upper_back_connector()
{
    difference()
    {
        union()
        {
            // basic shape
            lower_upper_connector();
            
            // first plexiglass holders
            translate([c_a/2-pg_wt,c_a/2-2*pg_wt-pg_t,ft_ho])
                pg_holder(pg_wt+ft_ho);
            
            // second plexiglass holders
            translate([-c_a/2,-c_a/2+pg_wt,ft_ho])
                rotate([0,0,-90])
                    pg_holder(pg_wt+ft_ho);
        }
        
        lower_leg_cut();
    
    }
}

module lower_upper_front_left_connector()
{
    difference()
    {
        render(5)
        union()
        {
            difference()
            {
                // main shape
                lower_upper_connector(-1);
                
                // hinge hole
                translate([c_a/2-h_oD/2+eps,-c_a/2+h_oD/2-eps,ft_h+ft_ho-hh_ob+eps])
                    outer_hinge_simple(h=hh_ob);
                
            }
            
            // left plexiglass holder
            translate([-c_a/2+2*pg_wt+pg_t,c_a/2-pg_wt,ft_ho])
                rotate([0,0,90])
                    pg_holder(pg_wt+ft_ho);
        }
        
        lower_leg_cut(-1);
    }
}

module lower_upper_front_right_connector()
{
    difference()
    {
        render(5)
        union()
        {
            difference()
            {
                // main shape
                lower_upper_connector(1);
                
                // hinge hole
                translate([-c_a/2+h_oD/2-eps,-c_a/2+h_oD/2-eps,ft_h+ft_ho-hh_ob+eps])
                    outer_hinge_simple(h=hh_ob,right=1);
                
            }
            
            // left plexiglass holder
            translate([c_a/2,c_a/2-pg_wt,ft_ho])
                rotate([0,0,90])
                    pg_holder(pg_wt+ft_ho);
        }
        
        lower_leg_cut(1);
    }
}

// middle connectors
/*
translate([0,300,0])
    lower_upper_back_connector();
*/

/*
translate([100,300,0])
    lowest_part();
*/

/*
translate([0,200,0])
    lower_upper_front_left_connector();

translate([100,200,0])
    lower_upper_front_right_connector();
*/

// module for the lowest part screwed to the table bellow
module lowest_part()
{
    difference()
    {
        // main body
        union()
        {
            translate([-c_a/2,-c_a/2,0])
                rc_cube([c_a,c_a,ft_t],2);
            translate([0,0,ft_t])
                cylinder(d1=ft_Di,d2=ft_di,h=ft_chi);
        }
        
        // hole for the screw
        translate([0,0,eps+c_h-(c_h-ft_chi-ft_t)])
            rotate([180,0,0])
                huge_screw_hole(hhd_b);
        
    }
}
